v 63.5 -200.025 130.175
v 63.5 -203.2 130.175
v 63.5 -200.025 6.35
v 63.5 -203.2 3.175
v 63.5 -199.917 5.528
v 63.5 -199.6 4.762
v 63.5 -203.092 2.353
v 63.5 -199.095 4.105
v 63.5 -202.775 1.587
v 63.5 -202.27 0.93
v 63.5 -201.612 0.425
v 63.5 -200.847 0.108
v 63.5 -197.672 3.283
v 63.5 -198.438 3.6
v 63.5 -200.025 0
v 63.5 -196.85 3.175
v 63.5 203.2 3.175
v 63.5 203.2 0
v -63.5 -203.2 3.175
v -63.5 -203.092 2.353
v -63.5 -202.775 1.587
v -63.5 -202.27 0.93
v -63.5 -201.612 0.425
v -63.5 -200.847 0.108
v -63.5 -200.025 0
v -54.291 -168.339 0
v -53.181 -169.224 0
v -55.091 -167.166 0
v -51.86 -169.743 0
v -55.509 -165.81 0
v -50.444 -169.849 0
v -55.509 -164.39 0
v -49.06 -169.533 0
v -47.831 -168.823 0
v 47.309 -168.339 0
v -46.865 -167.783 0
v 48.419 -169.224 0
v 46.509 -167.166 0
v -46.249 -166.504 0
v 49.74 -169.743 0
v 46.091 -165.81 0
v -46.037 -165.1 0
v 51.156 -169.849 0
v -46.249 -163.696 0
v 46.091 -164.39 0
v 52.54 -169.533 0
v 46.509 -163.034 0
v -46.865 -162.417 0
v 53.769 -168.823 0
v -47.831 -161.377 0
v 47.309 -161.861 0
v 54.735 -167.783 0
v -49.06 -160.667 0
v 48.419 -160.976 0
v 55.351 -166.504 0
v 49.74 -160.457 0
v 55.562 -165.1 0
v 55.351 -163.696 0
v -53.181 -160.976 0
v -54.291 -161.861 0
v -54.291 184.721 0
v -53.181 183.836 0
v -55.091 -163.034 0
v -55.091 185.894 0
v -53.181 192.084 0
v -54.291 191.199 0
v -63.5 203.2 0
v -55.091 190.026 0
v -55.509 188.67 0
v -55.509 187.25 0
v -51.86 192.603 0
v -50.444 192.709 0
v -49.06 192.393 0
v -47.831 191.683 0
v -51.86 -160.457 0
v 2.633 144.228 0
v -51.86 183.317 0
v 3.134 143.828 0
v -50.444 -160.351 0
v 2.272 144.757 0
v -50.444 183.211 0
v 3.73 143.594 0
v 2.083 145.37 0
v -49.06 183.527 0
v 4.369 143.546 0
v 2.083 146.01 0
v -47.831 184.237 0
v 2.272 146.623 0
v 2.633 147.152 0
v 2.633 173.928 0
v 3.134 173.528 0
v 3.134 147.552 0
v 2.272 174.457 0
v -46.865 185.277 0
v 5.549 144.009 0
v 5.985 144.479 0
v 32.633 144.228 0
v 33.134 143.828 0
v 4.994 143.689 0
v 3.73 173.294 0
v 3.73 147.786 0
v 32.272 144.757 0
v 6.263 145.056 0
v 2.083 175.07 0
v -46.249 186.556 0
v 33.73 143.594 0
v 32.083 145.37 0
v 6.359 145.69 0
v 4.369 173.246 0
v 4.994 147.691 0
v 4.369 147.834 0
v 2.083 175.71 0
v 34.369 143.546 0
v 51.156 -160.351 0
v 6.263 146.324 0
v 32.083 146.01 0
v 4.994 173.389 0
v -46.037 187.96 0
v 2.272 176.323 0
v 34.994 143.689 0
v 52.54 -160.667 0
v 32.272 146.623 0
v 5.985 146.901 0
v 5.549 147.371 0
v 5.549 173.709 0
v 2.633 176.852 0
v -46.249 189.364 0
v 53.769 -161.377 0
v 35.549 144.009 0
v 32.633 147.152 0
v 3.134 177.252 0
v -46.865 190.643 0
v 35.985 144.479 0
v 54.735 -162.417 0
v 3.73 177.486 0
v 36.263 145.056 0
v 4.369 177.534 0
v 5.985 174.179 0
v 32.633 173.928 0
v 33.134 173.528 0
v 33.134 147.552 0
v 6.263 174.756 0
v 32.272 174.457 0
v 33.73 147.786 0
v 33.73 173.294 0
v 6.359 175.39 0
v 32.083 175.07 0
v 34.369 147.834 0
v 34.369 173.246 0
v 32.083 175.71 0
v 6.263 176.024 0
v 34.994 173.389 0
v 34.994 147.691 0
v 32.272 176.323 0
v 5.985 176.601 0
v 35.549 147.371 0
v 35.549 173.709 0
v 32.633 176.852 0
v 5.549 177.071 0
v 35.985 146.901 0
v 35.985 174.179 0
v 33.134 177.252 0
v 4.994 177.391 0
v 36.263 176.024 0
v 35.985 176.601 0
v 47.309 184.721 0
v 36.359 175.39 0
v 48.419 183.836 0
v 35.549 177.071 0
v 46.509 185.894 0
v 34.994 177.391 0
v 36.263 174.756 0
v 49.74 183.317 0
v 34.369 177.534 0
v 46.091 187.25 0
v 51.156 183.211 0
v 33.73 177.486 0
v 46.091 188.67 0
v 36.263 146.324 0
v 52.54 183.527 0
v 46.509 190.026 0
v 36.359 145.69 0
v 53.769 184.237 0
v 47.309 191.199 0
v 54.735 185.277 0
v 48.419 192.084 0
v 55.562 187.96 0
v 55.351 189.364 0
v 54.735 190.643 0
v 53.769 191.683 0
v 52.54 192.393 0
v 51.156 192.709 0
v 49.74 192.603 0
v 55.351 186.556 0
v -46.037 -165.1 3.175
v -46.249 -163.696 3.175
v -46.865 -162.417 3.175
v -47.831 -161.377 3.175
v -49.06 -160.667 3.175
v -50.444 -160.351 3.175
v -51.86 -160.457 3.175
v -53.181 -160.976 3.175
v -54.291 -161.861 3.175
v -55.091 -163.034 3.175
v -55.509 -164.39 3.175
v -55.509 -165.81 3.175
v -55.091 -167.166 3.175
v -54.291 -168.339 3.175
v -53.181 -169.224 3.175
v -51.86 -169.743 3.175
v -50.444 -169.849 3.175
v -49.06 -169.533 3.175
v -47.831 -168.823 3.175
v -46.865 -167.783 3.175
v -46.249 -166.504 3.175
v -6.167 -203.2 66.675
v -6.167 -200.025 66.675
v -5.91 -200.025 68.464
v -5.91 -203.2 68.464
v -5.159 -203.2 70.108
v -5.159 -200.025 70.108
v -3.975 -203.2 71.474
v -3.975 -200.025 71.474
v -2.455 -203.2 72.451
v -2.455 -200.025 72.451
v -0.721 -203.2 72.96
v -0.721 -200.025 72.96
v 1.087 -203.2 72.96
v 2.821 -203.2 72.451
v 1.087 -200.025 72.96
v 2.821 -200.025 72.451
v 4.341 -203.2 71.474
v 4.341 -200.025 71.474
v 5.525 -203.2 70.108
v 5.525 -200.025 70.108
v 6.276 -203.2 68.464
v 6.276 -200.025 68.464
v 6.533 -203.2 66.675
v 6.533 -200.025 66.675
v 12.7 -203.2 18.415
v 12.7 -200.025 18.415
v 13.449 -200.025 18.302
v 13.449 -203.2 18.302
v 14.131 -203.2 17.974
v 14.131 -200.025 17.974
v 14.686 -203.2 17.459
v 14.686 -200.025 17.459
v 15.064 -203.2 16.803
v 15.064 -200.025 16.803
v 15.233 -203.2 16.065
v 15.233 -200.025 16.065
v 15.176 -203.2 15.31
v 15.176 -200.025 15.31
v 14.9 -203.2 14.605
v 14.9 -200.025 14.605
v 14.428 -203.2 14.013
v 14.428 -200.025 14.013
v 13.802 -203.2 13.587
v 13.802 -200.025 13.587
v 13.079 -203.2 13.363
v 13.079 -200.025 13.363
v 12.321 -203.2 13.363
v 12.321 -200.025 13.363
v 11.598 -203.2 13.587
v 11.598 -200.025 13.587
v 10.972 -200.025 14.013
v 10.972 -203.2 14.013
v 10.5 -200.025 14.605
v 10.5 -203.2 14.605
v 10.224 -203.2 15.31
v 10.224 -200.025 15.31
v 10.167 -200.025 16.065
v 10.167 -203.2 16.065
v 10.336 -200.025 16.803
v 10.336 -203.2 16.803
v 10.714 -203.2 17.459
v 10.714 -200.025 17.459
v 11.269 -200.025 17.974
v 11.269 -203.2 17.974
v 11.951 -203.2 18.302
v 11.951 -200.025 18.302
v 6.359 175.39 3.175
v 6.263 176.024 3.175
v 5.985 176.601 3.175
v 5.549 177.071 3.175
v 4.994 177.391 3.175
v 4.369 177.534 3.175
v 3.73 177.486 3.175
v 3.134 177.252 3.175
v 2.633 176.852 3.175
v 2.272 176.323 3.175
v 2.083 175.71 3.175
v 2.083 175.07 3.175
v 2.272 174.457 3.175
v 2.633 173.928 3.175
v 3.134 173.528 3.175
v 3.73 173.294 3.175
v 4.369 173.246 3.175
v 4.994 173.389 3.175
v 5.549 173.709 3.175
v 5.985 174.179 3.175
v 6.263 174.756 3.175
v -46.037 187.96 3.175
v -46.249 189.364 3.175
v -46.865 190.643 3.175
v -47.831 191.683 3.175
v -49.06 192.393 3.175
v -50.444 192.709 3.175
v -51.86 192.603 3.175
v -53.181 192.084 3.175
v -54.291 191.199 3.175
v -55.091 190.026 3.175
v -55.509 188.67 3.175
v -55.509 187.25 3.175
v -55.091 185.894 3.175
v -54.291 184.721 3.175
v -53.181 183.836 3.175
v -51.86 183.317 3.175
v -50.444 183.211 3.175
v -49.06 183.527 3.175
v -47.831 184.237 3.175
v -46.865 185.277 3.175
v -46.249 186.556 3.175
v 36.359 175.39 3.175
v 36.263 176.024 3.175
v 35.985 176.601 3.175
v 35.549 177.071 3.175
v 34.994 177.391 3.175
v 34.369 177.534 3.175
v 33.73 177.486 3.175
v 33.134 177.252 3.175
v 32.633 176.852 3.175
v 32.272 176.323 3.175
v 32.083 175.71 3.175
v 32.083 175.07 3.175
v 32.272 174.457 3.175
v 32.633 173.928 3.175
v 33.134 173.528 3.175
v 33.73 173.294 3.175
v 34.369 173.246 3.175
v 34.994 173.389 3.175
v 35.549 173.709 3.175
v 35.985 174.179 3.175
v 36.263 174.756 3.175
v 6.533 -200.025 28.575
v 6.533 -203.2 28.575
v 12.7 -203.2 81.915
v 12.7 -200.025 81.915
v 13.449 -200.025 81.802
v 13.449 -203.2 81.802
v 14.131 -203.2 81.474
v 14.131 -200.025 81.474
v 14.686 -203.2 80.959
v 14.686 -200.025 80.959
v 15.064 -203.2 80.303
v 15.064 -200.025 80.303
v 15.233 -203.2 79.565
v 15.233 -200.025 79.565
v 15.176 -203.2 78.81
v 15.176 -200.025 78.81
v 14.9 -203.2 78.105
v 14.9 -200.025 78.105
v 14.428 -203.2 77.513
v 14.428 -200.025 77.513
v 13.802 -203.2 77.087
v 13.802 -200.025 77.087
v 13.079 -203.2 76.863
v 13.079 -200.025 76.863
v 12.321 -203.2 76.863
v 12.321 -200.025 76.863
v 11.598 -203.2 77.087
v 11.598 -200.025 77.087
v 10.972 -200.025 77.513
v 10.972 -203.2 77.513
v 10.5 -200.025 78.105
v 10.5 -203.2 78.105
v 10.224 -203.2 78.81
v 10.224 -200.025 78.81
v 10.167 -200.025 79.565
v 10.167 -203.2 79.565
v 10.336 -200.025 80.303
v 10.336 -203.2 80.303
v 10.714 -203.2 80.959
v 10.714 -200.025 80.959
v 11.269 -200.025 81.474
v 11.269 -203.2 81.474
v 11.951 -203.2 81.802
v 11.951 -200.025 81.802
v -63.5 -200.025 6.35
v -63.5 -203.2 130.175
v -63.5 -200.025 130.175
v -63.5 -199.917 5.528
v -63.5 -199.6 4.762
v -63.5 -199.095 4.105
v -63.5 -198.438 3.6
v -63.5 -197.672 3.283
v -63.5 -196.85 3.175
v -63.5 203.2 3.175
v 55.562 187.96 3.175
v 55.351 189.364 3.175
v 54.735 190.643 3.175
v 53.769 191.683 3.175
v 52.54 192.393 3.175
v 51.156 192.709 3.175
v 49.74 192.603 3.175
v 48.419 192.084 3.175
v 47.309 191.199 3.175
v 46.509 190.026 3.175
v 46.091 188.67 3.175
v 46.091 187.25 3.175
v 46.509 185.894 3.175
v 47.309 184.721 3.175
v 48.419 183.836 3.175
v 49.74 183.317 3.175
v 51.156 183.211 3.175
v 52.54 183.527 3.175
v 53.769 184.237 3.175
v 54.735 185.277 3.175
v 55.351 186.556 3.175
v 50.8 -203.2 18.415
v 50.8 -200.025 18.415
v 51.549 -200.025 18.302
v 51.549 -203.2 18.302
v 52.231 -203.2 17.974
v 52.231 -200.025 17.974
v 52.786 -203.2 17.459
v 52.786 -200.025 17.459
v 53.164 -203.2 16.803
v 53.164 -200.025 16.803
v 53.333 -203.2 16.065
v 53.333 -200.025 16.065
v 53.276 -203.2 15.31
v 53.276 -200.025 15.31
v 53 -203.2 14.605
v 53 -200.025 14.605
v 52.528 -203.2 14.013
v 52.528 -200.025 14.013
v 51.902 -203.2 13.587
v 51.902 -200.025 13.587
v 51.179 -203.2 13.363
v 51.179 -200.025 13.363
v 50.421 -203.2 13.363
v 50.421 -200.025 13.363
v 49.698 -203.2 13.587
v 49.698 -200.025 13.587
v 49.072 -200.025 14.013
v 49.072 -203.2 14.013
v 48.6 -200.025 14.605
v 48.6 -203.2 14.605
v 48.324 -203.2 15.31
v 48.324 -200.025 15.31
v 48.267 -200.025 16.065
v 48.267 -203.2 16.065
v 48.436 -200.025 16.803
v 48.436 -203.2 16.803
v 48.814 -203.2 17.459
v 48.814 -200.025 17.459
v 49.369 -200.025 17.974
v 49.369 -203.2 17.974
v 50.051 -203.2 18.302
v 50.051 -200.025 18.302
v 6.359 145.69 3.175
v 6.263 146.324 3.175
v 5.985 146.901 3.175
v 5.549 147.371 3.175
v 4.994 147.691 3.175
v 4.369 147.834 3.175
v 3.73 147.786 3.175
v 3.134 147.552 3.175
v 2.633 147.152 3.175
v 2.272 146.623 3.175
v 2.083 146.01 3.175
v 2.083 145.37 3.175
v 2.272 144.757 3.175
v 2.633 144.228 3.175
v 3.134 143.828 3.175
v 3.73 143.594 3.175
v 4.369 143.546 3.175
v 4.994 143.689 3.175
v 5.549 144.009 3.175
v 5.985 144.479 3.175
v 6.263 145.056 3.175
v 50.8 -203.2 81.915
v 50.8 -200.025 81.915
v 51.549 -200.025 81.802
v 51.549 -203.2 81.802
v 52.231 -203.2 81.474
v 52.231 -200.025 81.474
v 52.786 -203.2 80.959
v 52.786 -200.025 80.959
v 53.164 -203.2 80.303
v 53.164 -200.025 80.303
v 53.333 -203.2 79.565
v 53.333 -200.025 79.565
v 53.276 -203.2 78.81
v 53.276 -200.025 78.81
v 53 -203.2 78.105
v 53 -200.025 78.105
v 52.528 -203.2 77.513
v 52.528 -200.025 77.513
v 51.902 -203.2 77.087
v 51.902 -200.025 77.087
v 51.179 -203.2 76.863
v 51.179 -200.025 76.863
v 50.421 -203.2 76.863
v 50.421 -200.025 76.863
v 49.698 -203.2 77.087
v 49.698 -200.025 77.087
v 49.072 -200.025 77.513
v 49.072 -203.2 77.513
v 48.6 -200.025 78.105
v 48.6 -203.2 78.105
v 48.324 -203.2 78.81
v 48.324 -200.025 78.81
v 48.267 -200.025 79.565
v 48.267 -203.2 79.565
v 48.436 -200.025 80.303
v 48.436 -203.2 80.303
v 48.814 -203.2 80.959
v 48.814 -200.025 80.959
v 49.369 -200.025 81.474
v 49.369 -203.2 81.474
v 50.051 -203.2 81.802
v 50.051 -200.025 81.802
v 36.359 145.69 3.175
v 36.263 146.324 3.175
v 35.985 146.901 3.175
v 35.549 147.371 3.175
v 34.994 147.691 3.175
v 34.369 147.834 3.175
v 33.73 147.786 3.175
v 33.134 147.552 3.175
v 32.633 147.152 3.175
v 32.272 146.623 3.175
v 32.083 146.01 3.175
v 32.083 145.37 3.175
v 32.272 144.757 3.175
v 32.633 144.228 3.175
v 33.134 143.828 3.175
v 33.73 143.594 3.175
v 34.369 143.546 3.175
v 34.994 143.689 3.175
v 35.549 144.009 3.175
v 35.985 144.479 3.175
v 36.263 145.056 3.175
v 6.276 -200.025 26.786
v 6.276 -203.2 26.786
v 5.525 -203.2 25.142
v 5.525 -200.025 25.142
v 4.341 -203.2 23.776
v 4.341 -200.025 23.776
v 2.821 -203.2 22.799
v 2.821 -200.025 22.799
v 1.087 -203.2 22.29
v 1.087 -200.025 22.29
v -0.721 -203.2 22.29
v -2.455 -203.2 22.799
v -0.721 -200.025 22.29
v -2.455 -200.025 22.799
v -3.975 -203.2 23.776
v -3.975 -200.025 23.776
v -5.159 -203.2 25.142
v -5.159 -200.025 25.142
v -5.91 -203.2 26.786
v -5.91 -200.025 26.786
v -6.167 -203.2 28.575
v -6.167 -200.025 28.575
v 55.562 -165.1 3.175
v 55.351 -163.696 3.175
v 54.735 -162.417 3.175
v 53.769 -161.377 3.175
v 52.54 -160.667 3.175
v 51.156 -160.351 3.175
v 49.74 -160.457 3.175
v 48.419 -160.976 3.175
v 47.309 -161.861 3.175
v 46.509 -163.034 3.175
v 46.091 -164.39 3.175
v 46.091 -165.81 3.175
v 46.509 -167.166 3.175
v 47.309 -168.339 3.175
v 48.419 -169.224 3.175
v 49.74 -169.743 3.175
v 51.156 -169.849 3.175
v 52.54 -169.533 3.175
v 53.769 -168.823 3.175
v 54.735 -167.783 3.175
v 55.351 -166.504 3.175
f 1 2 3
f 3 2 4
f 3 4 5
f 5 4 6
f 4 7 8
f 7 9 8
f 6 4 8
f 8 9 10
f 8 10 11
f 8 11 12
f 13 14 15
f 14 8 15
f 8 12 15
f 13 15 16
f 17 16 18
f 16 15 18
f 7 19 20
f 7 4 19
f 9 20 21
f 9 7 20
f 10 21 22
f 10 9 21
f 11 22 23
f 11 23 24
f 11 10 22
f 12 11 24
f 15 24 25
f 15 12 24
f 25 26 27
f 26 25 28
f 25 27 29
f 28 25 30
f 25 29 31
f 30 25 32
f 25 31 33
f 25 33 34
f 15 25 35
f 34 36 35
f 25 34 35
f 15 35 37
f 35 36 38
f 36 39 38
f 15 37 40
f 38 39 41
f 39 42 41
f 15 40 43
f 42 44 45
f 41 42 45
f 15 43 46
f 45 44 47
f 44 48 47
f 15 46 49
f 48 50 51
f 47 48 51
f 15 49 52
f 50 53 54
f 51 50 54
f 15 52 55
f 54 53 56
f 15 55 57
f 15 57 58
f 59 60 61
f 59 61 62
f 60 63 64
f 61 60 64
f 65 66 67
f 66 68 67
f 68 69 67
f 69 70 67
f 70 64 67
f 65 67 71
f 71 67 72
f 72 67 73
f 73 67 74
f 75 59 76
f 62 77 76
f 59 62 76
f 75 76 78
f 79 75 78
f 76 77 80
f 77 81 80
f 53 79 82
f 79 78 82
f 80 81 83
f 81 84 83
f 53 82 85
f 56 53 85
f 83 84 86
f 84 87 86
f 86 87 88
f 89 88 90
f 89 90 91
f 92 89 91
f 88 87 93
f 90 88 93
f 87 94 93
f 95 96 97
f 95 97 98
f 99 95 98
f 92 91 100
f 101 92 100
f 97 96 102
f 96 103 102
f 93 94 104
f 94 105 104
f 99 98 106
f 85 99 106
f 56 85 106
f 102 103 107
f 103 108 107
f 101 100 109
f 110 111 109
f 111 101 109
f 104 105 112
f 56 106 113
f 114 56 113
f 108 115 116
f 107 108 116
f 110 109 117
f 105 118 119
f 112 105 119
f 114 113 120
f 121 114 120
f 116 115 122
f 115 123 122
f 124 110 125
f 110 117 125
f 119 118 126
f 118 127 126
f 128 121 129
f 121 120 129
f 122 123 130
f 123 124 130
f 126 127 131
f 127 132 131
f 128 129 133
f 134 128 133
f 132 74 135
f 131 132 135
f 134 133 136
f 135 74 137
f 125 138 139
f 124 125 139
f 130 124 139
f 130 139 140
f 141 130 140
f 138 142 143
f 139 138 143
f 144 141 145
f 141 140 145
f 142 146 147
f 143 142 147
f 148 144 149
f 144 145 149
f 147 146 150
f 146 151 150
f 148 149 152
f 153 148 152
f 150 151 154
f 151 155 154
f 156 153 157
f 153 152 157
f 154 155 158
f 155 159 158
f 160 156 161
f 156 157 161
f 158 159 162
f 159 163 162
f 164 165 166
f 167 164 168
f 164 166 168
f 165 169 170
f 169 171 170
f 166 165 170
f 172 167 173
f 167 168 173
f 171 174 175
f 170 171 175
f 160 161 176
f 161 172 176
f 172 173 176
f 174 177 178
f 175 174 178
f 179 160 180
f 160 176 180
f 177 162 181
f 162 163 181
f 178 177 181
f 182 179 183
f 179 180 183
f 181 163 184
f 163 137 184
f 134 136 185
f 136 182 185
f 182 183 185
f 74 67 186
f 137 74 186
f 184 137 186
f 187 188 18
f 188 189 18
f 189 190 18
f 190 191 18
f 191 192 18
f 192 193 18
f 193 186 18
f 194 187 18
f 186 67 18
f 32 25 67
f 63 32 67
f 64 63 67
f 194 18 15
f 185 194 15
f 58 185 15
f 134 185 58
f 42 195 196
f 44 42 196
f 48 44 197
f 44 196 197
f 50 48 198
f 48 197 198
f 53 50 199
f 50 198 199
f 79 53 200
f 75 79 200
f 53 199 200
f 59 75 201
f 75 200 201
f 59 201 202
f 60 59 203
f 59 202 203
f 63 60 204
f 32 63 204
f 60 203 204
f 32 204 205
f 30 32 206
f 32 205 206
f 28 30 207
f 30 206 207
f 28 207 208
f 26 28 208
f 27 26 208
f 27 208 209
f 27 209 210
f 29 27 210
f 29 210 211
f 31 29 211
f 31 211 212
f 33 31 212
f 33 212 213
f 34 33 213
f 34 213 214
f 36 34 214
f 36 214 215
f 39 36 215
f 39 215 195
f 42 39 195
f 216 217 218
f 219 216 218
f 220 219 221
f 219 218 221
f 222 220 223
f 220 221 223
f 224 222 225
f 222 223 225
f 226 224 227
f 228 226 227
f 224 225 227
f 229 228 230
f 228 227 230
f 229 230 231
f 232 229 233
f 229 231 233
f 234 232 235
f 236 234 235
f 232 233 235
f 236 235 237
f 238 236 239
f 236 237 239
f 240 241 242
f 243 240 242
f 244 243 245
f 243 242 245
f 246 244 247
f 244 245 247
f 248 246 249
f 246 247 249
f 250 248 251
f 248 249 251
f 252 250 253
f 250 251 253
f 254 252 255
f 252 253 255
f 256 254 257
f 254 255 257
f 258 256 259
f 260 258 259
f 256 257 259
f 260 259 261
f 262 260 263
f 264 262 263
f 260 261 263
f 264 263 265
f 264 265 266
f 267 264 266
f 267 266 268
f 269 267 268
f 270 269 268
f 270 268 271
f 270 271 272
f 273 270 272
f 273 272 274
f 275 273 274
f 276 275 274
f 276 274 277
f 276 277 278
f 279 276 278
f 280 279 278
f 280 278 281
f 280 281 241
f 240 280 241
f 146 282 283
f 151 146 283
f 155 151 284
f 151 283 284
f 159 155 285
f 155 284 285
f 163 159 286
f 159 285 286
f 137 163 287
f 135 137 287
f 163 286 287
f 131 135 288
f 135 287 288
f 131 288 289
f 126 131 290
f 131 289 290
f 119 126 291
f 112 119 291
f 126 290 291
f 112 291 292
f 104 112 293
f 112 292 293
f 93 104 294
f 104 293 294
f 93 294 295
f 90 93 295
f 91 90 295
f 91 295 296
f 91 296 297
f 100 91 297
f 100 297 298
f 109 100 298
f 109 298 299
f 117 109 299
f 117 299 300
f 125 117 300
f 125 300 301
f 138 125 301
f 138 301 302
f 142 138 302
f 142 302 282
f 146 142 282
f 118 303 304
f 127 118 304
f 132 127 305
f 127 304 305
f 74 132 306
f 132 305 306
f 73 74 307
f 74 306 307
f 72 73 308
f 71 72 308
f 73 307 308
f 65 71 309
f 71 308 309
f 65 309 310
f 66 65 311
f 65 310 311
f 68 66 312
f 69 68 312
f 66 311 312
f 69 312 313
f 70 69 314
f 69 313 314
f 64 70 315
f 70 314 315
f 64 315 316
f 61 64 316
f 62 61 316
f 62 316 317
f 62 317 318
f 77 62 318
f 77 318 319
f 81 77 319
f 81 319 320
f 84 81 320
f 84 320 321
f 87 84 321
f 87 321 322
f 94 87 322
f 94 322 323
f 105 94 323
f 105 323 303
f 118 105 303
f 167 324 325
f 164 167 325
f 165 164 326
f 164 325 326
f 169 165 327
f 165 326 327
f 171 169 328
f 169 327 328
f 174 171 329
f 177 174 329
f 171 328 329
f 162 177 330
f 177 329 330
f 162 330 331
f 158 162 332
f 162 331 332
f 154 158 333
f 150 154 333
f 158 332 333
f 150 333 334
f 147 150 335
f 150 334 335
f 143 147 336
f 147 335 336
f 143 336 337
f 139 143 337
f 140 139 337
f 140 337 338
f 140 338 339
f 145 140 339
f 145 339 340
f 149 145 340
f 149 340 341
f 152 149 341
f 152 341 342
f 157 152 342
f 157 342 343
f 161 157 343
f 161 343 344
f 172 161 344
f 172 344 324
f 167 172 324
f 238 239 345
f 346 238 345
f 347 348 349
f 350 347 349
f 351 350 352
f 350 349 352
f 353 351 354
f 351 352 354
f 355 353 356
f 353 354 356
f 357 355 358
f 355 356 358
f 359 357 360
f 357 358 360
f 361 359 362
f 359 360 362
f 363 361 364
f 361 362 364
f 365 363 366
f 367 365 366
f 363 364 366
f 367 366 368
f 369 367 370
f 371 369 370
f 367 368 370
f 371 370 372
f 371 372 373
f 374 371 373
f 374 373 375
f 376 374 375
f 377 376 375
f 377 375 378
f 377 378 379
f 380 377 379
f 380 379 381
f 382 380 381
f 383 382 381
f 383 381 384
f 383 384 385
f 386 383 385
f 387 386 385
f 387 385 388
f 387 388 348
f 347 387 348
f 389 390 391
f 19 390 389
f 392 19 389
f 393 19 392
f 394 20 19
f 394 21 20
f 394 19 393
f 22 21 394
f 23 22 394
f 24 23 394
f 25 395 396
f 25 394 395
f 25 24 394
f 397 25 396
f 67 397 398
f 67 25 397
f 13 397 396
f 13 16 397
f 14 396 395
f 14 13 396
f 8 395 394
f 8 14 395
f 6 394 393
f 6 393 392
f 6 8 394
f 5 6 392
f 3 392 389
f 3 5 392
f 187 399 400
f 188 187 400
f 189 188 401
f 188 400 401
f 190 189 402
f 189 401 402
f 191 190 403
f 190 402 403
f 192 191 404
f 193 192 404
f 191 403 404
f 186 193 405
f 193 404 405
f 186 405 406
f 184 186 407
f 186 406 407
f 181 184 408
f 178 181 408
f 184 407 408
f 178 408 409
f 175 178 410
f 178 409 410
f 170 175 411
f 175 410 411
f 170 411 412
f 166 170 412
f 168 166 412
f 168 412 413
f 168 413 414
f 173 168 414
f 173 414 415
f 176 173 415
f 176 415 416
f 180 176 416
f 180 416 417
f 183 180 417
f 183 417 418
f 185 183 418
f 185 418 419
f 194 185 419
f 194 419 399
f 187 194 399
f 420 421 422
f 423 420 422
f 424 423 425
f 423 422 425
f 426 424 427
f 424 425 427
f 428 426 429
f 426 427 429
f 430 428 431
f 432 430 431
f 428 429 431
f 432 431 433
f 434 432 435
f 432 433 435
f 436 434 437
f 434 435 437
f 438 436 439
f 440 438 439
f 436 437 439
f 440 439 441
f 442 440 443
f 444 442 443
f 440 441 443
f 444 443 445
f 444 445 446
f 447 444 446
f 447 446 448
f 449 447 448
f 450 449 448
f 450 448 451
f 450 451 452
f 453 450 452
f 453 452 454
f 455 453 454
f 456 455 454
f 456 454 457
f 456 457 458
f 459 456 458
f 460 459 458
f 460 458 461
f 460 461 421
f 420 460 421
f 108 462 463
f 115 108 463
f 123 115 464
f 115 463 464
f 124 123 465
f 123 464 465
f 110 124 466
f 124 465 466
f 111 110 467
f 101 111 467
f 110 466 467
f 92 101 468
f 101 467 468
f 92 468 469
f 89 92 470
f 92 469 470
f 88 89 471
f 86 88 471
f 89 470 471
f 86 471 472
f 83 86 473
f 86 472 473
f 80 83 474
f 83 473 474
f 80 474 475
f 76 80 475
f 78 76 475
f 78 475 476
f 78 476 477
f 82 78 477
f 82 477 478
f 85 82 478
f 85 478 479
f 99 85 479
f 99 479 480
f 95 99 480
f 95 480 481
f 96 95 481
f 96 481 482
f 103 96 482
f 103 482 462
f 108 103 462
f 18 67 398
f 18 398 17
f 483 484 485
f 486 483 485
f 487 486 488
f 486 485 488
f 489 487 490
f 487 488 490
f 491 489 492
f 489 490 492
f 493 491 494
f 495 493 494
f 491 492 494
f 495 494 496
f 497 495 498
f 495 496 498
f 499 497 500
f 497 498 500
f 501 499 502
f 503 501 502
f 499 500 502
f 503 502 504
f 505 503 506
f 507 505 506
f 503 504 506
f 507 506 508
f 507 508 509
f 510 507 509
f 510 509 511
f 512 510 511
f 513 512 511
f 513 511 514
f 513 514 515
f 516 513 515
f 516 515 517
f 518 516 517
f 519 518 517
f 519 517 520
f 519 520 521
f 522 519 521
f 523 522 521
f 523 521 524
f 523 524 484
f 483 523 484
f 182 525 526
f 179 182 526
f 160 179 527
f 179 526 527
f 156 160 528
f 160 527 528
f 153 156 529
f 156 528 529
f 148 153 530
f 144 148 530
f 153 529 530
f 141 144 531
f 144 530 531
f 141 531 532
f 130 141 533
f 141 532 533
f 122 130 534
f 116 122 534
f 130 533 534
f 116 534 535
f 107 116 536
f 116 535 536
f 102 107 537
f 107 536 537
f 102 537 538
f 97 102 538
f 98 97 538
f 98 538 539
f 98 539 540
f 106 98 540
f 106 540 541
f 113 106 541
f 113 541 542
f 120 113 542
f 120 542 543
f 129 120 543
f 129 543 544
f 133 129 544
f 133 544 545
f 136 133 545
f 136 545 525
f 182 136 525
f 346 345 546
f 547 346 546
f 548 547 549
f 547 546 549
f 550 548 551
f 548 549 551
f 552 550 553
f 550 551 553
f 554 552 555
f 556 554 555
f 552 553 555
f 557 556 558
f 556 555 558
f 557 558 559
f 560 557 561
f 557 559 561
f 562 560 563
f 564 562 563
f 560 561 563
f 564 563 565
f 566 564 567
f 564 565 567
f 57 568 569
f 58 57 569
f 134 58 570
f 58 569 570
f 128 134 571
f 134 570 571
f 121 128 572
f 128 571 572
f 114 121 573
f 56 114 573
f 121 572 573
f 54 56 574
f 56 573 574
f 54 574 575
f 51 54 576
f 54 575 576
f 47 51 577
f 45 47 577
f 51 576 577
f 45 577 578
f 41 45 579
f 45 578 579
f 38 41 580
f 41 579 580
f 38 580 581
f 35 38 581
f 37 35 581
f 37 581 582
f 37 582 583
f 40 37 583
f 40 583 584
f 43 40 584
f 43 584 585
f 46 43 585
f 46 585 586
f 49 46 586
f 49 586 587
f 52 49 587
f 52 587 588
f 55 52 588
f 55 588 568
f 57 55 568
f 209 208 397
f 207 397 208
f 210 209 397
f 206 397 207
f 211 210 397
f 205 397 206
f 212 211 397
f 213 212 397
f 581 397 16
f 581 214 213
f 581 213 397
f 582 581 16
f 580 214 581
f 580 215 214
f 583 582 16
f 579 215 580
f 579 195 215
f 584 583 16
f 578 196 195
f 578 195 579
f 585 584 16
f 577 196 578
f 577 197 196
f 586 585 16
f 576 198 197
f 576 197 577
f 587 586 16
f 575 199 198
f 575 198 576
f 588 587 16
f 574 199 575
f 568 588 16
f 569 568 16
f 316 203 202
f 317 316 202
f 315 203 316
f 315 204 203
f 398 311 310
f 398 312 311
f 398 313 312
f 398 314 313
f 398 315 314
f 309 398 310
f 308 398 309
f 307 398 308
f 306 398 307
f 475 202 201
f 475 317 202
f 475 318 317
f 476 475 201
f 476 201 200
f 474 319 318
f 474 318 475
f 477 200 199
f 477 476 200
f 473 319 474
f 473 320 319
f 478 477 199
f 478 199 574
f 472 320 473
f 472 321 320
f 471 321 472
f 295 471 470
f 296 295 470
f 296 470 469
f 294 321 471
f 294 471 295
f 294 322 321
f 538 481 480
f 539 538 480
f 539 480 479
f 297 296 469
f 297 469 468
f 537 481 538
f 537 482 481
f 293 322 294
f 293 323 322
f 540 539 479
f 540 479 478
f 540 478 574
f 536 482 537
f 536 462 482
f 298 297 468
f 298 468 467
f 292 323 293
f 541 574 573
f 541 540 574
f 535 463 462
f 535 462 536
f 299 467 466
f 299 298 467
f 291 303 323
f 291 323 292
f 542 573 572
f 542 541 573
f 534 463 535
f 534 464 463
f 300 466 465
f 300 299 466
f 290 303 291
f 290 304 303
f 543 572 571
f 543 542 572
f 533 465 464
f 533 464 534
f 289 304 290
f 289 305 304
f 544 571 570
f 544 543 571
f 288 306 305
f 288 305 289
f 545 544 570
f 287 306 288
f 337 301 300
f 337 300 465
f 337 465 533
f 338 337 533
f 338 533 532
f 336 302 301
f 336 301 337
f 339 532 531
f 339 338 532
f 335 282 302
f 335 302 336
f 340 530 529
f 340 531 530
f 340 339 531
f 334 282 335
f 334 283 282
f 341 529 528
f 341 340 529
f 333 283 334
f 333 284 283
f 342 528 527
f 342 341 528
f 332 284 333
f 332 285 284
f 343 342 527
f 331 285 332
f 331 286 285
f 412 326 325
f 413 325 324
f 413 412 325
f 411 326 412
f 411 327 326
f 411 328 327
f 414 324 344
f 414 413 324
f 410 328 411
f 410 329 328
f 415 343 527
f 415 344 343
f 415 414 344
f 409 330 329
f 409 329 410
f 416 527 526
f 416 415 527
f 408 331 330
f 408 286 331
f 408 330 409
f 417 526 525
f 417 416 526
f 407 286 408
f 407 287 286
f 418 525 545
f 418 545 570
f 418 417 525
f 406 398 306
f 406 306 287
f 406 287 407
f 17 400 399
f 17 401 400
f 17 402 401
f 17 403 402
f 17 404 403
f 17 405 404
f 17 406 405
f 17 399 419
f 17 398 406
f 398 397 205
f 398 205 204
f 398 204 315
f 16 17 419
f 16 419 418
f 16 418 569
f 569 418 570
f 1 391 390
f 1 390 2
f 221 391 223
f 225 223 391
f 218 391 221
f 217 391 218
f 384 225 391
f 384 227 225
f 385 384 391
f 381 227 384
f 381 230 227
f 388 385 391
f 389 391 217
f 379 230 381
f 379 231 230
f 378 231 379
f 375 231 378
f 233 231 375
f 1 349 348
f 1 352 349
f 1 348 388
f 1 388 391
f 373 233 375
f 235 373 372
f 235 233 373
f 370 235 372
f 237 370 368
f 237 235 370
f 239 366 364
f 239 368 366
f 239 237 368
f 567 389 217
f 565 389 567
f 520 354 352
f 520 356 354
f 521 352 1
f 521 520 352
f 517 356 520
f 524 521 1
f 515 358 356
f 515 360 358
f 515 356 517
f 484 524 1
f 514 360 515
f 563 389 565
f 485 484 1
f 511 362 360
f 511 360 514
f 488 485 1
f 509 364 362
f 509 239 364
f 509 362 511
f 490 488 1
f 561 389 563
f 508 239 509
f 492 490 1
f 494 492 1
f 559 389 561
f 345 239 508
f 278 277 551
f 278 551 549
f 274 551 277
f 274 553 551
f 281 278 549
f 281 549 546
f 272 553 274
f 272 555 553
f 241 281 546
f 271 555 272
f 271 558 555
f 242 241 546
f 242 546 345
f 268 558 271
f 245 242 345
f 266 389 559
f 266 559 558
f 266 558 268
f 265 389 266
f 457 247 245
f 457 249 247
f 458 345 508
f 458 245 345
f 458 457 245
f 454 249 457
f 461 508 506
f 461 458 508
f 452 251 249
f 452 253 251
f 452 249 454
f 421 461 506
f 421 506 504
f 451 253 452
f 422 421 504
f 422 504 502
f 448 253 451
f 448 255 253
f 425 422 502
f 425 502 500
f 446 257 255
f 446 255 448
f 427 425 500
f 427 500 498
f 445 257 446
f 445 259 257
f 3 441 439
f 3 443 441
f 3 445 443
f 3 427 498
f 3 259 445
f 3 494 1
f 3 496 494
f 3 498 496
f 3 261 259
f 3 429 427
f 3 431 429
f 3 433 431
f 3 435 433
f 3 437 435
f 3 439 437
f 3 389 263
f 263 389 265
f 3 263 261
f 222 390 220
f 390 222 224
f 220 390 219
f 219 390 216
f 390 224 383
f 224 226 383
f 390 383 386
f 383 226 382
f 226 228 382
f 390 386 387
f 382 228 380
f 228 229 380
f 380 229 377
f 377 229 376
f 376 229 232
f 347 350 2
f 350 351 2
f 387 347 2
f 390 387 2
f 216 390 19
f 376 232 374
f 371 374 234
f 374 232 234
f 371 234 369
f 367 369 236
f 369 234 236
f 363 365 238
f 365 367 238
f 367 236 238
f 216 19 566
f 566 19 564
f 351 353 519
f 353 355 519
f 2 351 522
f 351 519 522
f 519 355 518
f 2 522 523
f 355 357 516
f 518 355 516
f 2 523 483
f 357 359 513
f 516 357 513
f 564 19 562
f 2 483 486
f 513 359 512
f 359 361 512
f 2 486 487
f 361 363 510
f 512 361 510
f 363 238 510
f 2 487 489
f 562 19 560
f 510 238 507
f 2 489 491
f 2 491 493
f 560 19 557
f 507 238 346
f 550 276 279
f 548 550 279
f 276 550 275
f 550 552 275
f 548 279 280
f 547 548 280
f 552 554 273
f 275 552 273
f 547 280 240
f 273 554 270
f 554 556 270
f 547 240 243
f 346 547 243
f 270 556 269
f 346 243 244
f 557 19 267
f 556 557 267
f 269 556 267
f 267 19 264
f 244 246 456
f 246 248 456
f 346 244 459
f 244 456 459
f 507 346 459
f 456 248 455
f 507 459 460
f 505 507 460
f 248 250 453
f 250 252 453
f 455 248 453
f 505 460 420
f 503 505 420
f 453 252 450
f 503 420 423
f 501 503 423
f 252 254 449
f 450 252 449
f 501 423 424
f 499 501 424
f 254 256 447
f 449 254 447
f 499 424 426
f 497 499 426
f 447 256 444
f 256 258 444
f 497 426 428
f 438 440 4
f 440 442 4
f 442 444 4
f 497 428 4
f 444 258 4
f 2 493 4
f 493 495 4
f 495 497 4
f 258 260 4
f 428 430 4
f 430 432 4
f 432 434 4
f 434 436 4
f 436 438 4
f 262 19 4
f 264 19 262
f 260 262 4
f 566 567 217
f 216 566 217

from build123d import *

# Parameters (mm, degrees)
SKETCH2_W           = 127
SKETCH2_H           = 406.4
BOSS_EXTRUDE1_DEPTH = 3.175
SKETCH3_W           = 127
SKETCH3_H           = 3.175
BOSS_EXTRUDE2_DEPTH = 127
FILLET1_R           = 3.175
SKETCH4_R           = 2.54
CUT_EXTRUDE1_DEPTH  = 429.448574802
SKETCH5_R           = 4.7625
SKETCH5_R_2         = 2.15
CUT_EXTRUDE2_DEPTH  = 248.894110458


with BuildPart() as part:
    # Sketch2 → Boss-Extrude1 (new body)
    with BuildSketch(Plane.XY):
        Rectangle(SKETCH2_W, SKETCH2_H)
    extrude(amount=BOSS_EXTRUDE1_DEPTH)

    # Sketch3 → Boss-Extrude2 (add)
    with BuildSketch(Plane.XY.offset(3.175)):
        with Locations((0, -201.6125)):
            Rectangle(SKETCH3_W, SKETCH3_H)
    extrude(amount=BOSS_EXTRUDE2_DEPTH)

    # Fillet1
    fillet1_edges = [part.edges().sort_by_distance(p)[0] for p in [
        (0, -200.025, 3.175),
        (0, -203.2, 0),
    ]]
    fillet(fillet1_edges, radius=FILLET1_R)

    # Sketch4 → Cut-Extrude1 (cut, through all)
    with BuildSketch(Plane(origin=(0, -200.025, 0), x_dir=(1, 0, 0), z_dir=(0, 1, 0))):
        with BuildLine():
            ThreePointArc((-6.167107762, -66.675), (0.182892238, -73.025), (6.532892238, -66.675))
            Line((6.532892238, -66.675), (6.532892238, -28.575))
            ThreePointArc((6.532892238, -28.575), (0.182892238, -22.225), (-6.167107762, -28.575))
            Line((-6.167107762, -28.575), (-6.167107762, -66.675))
        make_face()
        with Locations(Location((12.7, -79.375, 0), (0, 0, 270))):
            Circle(SKETCH4_R)
        with Locations(Location((50.8, -79.375, 0), (0, 0, 270))):
            Circle(SKETCH4_R)
        with Locations(Location((50.8, -15.875, 0), (0, 0, 270))):
            Circle(SKETCH4_R)
        with Locations(Location((12.7, -15.875, 0), (0, 0, 270))):
            Circle(SKETCH4_R)
    extrude(amount=-CUT_EXTRUDE1_DEPTH, mode=Mode.SUBTRACT)

    # Sketch5 → Cut-Extrude2 (cut, through all)
    with BuildSketch(Plane.XY.offset(3.175)):
        with Locations((-50.8, 187.96)):
            Circle(SKETCH5_R)
        with Locations((50.8, 187.96)):
            Circle(SKETCH5_R)
        with Locations((-50.8, -165.1)):
            Circle(SKETCH5_R)
        with Locations((50.8, -165.1)):
            Circle(SKETCH5_R)
        with Locations((34.20875, 175.39)):
            Circle(SKETCH5_R_2)
        with Locations((4.20875, 175.39)):
            Circle(SKETCH5_R_2)
        with Locations((4.20875, 145.69)):
            Circle(SKETCH5_R_2)
        with Locations((34.20875, 145.69)):
            Circle(SKETCH5_R_2)
    extrude(amount=-CUT_EXTRUDE2_DEPTH, mode=Mode.SUBTRACT)


solid = part.part
